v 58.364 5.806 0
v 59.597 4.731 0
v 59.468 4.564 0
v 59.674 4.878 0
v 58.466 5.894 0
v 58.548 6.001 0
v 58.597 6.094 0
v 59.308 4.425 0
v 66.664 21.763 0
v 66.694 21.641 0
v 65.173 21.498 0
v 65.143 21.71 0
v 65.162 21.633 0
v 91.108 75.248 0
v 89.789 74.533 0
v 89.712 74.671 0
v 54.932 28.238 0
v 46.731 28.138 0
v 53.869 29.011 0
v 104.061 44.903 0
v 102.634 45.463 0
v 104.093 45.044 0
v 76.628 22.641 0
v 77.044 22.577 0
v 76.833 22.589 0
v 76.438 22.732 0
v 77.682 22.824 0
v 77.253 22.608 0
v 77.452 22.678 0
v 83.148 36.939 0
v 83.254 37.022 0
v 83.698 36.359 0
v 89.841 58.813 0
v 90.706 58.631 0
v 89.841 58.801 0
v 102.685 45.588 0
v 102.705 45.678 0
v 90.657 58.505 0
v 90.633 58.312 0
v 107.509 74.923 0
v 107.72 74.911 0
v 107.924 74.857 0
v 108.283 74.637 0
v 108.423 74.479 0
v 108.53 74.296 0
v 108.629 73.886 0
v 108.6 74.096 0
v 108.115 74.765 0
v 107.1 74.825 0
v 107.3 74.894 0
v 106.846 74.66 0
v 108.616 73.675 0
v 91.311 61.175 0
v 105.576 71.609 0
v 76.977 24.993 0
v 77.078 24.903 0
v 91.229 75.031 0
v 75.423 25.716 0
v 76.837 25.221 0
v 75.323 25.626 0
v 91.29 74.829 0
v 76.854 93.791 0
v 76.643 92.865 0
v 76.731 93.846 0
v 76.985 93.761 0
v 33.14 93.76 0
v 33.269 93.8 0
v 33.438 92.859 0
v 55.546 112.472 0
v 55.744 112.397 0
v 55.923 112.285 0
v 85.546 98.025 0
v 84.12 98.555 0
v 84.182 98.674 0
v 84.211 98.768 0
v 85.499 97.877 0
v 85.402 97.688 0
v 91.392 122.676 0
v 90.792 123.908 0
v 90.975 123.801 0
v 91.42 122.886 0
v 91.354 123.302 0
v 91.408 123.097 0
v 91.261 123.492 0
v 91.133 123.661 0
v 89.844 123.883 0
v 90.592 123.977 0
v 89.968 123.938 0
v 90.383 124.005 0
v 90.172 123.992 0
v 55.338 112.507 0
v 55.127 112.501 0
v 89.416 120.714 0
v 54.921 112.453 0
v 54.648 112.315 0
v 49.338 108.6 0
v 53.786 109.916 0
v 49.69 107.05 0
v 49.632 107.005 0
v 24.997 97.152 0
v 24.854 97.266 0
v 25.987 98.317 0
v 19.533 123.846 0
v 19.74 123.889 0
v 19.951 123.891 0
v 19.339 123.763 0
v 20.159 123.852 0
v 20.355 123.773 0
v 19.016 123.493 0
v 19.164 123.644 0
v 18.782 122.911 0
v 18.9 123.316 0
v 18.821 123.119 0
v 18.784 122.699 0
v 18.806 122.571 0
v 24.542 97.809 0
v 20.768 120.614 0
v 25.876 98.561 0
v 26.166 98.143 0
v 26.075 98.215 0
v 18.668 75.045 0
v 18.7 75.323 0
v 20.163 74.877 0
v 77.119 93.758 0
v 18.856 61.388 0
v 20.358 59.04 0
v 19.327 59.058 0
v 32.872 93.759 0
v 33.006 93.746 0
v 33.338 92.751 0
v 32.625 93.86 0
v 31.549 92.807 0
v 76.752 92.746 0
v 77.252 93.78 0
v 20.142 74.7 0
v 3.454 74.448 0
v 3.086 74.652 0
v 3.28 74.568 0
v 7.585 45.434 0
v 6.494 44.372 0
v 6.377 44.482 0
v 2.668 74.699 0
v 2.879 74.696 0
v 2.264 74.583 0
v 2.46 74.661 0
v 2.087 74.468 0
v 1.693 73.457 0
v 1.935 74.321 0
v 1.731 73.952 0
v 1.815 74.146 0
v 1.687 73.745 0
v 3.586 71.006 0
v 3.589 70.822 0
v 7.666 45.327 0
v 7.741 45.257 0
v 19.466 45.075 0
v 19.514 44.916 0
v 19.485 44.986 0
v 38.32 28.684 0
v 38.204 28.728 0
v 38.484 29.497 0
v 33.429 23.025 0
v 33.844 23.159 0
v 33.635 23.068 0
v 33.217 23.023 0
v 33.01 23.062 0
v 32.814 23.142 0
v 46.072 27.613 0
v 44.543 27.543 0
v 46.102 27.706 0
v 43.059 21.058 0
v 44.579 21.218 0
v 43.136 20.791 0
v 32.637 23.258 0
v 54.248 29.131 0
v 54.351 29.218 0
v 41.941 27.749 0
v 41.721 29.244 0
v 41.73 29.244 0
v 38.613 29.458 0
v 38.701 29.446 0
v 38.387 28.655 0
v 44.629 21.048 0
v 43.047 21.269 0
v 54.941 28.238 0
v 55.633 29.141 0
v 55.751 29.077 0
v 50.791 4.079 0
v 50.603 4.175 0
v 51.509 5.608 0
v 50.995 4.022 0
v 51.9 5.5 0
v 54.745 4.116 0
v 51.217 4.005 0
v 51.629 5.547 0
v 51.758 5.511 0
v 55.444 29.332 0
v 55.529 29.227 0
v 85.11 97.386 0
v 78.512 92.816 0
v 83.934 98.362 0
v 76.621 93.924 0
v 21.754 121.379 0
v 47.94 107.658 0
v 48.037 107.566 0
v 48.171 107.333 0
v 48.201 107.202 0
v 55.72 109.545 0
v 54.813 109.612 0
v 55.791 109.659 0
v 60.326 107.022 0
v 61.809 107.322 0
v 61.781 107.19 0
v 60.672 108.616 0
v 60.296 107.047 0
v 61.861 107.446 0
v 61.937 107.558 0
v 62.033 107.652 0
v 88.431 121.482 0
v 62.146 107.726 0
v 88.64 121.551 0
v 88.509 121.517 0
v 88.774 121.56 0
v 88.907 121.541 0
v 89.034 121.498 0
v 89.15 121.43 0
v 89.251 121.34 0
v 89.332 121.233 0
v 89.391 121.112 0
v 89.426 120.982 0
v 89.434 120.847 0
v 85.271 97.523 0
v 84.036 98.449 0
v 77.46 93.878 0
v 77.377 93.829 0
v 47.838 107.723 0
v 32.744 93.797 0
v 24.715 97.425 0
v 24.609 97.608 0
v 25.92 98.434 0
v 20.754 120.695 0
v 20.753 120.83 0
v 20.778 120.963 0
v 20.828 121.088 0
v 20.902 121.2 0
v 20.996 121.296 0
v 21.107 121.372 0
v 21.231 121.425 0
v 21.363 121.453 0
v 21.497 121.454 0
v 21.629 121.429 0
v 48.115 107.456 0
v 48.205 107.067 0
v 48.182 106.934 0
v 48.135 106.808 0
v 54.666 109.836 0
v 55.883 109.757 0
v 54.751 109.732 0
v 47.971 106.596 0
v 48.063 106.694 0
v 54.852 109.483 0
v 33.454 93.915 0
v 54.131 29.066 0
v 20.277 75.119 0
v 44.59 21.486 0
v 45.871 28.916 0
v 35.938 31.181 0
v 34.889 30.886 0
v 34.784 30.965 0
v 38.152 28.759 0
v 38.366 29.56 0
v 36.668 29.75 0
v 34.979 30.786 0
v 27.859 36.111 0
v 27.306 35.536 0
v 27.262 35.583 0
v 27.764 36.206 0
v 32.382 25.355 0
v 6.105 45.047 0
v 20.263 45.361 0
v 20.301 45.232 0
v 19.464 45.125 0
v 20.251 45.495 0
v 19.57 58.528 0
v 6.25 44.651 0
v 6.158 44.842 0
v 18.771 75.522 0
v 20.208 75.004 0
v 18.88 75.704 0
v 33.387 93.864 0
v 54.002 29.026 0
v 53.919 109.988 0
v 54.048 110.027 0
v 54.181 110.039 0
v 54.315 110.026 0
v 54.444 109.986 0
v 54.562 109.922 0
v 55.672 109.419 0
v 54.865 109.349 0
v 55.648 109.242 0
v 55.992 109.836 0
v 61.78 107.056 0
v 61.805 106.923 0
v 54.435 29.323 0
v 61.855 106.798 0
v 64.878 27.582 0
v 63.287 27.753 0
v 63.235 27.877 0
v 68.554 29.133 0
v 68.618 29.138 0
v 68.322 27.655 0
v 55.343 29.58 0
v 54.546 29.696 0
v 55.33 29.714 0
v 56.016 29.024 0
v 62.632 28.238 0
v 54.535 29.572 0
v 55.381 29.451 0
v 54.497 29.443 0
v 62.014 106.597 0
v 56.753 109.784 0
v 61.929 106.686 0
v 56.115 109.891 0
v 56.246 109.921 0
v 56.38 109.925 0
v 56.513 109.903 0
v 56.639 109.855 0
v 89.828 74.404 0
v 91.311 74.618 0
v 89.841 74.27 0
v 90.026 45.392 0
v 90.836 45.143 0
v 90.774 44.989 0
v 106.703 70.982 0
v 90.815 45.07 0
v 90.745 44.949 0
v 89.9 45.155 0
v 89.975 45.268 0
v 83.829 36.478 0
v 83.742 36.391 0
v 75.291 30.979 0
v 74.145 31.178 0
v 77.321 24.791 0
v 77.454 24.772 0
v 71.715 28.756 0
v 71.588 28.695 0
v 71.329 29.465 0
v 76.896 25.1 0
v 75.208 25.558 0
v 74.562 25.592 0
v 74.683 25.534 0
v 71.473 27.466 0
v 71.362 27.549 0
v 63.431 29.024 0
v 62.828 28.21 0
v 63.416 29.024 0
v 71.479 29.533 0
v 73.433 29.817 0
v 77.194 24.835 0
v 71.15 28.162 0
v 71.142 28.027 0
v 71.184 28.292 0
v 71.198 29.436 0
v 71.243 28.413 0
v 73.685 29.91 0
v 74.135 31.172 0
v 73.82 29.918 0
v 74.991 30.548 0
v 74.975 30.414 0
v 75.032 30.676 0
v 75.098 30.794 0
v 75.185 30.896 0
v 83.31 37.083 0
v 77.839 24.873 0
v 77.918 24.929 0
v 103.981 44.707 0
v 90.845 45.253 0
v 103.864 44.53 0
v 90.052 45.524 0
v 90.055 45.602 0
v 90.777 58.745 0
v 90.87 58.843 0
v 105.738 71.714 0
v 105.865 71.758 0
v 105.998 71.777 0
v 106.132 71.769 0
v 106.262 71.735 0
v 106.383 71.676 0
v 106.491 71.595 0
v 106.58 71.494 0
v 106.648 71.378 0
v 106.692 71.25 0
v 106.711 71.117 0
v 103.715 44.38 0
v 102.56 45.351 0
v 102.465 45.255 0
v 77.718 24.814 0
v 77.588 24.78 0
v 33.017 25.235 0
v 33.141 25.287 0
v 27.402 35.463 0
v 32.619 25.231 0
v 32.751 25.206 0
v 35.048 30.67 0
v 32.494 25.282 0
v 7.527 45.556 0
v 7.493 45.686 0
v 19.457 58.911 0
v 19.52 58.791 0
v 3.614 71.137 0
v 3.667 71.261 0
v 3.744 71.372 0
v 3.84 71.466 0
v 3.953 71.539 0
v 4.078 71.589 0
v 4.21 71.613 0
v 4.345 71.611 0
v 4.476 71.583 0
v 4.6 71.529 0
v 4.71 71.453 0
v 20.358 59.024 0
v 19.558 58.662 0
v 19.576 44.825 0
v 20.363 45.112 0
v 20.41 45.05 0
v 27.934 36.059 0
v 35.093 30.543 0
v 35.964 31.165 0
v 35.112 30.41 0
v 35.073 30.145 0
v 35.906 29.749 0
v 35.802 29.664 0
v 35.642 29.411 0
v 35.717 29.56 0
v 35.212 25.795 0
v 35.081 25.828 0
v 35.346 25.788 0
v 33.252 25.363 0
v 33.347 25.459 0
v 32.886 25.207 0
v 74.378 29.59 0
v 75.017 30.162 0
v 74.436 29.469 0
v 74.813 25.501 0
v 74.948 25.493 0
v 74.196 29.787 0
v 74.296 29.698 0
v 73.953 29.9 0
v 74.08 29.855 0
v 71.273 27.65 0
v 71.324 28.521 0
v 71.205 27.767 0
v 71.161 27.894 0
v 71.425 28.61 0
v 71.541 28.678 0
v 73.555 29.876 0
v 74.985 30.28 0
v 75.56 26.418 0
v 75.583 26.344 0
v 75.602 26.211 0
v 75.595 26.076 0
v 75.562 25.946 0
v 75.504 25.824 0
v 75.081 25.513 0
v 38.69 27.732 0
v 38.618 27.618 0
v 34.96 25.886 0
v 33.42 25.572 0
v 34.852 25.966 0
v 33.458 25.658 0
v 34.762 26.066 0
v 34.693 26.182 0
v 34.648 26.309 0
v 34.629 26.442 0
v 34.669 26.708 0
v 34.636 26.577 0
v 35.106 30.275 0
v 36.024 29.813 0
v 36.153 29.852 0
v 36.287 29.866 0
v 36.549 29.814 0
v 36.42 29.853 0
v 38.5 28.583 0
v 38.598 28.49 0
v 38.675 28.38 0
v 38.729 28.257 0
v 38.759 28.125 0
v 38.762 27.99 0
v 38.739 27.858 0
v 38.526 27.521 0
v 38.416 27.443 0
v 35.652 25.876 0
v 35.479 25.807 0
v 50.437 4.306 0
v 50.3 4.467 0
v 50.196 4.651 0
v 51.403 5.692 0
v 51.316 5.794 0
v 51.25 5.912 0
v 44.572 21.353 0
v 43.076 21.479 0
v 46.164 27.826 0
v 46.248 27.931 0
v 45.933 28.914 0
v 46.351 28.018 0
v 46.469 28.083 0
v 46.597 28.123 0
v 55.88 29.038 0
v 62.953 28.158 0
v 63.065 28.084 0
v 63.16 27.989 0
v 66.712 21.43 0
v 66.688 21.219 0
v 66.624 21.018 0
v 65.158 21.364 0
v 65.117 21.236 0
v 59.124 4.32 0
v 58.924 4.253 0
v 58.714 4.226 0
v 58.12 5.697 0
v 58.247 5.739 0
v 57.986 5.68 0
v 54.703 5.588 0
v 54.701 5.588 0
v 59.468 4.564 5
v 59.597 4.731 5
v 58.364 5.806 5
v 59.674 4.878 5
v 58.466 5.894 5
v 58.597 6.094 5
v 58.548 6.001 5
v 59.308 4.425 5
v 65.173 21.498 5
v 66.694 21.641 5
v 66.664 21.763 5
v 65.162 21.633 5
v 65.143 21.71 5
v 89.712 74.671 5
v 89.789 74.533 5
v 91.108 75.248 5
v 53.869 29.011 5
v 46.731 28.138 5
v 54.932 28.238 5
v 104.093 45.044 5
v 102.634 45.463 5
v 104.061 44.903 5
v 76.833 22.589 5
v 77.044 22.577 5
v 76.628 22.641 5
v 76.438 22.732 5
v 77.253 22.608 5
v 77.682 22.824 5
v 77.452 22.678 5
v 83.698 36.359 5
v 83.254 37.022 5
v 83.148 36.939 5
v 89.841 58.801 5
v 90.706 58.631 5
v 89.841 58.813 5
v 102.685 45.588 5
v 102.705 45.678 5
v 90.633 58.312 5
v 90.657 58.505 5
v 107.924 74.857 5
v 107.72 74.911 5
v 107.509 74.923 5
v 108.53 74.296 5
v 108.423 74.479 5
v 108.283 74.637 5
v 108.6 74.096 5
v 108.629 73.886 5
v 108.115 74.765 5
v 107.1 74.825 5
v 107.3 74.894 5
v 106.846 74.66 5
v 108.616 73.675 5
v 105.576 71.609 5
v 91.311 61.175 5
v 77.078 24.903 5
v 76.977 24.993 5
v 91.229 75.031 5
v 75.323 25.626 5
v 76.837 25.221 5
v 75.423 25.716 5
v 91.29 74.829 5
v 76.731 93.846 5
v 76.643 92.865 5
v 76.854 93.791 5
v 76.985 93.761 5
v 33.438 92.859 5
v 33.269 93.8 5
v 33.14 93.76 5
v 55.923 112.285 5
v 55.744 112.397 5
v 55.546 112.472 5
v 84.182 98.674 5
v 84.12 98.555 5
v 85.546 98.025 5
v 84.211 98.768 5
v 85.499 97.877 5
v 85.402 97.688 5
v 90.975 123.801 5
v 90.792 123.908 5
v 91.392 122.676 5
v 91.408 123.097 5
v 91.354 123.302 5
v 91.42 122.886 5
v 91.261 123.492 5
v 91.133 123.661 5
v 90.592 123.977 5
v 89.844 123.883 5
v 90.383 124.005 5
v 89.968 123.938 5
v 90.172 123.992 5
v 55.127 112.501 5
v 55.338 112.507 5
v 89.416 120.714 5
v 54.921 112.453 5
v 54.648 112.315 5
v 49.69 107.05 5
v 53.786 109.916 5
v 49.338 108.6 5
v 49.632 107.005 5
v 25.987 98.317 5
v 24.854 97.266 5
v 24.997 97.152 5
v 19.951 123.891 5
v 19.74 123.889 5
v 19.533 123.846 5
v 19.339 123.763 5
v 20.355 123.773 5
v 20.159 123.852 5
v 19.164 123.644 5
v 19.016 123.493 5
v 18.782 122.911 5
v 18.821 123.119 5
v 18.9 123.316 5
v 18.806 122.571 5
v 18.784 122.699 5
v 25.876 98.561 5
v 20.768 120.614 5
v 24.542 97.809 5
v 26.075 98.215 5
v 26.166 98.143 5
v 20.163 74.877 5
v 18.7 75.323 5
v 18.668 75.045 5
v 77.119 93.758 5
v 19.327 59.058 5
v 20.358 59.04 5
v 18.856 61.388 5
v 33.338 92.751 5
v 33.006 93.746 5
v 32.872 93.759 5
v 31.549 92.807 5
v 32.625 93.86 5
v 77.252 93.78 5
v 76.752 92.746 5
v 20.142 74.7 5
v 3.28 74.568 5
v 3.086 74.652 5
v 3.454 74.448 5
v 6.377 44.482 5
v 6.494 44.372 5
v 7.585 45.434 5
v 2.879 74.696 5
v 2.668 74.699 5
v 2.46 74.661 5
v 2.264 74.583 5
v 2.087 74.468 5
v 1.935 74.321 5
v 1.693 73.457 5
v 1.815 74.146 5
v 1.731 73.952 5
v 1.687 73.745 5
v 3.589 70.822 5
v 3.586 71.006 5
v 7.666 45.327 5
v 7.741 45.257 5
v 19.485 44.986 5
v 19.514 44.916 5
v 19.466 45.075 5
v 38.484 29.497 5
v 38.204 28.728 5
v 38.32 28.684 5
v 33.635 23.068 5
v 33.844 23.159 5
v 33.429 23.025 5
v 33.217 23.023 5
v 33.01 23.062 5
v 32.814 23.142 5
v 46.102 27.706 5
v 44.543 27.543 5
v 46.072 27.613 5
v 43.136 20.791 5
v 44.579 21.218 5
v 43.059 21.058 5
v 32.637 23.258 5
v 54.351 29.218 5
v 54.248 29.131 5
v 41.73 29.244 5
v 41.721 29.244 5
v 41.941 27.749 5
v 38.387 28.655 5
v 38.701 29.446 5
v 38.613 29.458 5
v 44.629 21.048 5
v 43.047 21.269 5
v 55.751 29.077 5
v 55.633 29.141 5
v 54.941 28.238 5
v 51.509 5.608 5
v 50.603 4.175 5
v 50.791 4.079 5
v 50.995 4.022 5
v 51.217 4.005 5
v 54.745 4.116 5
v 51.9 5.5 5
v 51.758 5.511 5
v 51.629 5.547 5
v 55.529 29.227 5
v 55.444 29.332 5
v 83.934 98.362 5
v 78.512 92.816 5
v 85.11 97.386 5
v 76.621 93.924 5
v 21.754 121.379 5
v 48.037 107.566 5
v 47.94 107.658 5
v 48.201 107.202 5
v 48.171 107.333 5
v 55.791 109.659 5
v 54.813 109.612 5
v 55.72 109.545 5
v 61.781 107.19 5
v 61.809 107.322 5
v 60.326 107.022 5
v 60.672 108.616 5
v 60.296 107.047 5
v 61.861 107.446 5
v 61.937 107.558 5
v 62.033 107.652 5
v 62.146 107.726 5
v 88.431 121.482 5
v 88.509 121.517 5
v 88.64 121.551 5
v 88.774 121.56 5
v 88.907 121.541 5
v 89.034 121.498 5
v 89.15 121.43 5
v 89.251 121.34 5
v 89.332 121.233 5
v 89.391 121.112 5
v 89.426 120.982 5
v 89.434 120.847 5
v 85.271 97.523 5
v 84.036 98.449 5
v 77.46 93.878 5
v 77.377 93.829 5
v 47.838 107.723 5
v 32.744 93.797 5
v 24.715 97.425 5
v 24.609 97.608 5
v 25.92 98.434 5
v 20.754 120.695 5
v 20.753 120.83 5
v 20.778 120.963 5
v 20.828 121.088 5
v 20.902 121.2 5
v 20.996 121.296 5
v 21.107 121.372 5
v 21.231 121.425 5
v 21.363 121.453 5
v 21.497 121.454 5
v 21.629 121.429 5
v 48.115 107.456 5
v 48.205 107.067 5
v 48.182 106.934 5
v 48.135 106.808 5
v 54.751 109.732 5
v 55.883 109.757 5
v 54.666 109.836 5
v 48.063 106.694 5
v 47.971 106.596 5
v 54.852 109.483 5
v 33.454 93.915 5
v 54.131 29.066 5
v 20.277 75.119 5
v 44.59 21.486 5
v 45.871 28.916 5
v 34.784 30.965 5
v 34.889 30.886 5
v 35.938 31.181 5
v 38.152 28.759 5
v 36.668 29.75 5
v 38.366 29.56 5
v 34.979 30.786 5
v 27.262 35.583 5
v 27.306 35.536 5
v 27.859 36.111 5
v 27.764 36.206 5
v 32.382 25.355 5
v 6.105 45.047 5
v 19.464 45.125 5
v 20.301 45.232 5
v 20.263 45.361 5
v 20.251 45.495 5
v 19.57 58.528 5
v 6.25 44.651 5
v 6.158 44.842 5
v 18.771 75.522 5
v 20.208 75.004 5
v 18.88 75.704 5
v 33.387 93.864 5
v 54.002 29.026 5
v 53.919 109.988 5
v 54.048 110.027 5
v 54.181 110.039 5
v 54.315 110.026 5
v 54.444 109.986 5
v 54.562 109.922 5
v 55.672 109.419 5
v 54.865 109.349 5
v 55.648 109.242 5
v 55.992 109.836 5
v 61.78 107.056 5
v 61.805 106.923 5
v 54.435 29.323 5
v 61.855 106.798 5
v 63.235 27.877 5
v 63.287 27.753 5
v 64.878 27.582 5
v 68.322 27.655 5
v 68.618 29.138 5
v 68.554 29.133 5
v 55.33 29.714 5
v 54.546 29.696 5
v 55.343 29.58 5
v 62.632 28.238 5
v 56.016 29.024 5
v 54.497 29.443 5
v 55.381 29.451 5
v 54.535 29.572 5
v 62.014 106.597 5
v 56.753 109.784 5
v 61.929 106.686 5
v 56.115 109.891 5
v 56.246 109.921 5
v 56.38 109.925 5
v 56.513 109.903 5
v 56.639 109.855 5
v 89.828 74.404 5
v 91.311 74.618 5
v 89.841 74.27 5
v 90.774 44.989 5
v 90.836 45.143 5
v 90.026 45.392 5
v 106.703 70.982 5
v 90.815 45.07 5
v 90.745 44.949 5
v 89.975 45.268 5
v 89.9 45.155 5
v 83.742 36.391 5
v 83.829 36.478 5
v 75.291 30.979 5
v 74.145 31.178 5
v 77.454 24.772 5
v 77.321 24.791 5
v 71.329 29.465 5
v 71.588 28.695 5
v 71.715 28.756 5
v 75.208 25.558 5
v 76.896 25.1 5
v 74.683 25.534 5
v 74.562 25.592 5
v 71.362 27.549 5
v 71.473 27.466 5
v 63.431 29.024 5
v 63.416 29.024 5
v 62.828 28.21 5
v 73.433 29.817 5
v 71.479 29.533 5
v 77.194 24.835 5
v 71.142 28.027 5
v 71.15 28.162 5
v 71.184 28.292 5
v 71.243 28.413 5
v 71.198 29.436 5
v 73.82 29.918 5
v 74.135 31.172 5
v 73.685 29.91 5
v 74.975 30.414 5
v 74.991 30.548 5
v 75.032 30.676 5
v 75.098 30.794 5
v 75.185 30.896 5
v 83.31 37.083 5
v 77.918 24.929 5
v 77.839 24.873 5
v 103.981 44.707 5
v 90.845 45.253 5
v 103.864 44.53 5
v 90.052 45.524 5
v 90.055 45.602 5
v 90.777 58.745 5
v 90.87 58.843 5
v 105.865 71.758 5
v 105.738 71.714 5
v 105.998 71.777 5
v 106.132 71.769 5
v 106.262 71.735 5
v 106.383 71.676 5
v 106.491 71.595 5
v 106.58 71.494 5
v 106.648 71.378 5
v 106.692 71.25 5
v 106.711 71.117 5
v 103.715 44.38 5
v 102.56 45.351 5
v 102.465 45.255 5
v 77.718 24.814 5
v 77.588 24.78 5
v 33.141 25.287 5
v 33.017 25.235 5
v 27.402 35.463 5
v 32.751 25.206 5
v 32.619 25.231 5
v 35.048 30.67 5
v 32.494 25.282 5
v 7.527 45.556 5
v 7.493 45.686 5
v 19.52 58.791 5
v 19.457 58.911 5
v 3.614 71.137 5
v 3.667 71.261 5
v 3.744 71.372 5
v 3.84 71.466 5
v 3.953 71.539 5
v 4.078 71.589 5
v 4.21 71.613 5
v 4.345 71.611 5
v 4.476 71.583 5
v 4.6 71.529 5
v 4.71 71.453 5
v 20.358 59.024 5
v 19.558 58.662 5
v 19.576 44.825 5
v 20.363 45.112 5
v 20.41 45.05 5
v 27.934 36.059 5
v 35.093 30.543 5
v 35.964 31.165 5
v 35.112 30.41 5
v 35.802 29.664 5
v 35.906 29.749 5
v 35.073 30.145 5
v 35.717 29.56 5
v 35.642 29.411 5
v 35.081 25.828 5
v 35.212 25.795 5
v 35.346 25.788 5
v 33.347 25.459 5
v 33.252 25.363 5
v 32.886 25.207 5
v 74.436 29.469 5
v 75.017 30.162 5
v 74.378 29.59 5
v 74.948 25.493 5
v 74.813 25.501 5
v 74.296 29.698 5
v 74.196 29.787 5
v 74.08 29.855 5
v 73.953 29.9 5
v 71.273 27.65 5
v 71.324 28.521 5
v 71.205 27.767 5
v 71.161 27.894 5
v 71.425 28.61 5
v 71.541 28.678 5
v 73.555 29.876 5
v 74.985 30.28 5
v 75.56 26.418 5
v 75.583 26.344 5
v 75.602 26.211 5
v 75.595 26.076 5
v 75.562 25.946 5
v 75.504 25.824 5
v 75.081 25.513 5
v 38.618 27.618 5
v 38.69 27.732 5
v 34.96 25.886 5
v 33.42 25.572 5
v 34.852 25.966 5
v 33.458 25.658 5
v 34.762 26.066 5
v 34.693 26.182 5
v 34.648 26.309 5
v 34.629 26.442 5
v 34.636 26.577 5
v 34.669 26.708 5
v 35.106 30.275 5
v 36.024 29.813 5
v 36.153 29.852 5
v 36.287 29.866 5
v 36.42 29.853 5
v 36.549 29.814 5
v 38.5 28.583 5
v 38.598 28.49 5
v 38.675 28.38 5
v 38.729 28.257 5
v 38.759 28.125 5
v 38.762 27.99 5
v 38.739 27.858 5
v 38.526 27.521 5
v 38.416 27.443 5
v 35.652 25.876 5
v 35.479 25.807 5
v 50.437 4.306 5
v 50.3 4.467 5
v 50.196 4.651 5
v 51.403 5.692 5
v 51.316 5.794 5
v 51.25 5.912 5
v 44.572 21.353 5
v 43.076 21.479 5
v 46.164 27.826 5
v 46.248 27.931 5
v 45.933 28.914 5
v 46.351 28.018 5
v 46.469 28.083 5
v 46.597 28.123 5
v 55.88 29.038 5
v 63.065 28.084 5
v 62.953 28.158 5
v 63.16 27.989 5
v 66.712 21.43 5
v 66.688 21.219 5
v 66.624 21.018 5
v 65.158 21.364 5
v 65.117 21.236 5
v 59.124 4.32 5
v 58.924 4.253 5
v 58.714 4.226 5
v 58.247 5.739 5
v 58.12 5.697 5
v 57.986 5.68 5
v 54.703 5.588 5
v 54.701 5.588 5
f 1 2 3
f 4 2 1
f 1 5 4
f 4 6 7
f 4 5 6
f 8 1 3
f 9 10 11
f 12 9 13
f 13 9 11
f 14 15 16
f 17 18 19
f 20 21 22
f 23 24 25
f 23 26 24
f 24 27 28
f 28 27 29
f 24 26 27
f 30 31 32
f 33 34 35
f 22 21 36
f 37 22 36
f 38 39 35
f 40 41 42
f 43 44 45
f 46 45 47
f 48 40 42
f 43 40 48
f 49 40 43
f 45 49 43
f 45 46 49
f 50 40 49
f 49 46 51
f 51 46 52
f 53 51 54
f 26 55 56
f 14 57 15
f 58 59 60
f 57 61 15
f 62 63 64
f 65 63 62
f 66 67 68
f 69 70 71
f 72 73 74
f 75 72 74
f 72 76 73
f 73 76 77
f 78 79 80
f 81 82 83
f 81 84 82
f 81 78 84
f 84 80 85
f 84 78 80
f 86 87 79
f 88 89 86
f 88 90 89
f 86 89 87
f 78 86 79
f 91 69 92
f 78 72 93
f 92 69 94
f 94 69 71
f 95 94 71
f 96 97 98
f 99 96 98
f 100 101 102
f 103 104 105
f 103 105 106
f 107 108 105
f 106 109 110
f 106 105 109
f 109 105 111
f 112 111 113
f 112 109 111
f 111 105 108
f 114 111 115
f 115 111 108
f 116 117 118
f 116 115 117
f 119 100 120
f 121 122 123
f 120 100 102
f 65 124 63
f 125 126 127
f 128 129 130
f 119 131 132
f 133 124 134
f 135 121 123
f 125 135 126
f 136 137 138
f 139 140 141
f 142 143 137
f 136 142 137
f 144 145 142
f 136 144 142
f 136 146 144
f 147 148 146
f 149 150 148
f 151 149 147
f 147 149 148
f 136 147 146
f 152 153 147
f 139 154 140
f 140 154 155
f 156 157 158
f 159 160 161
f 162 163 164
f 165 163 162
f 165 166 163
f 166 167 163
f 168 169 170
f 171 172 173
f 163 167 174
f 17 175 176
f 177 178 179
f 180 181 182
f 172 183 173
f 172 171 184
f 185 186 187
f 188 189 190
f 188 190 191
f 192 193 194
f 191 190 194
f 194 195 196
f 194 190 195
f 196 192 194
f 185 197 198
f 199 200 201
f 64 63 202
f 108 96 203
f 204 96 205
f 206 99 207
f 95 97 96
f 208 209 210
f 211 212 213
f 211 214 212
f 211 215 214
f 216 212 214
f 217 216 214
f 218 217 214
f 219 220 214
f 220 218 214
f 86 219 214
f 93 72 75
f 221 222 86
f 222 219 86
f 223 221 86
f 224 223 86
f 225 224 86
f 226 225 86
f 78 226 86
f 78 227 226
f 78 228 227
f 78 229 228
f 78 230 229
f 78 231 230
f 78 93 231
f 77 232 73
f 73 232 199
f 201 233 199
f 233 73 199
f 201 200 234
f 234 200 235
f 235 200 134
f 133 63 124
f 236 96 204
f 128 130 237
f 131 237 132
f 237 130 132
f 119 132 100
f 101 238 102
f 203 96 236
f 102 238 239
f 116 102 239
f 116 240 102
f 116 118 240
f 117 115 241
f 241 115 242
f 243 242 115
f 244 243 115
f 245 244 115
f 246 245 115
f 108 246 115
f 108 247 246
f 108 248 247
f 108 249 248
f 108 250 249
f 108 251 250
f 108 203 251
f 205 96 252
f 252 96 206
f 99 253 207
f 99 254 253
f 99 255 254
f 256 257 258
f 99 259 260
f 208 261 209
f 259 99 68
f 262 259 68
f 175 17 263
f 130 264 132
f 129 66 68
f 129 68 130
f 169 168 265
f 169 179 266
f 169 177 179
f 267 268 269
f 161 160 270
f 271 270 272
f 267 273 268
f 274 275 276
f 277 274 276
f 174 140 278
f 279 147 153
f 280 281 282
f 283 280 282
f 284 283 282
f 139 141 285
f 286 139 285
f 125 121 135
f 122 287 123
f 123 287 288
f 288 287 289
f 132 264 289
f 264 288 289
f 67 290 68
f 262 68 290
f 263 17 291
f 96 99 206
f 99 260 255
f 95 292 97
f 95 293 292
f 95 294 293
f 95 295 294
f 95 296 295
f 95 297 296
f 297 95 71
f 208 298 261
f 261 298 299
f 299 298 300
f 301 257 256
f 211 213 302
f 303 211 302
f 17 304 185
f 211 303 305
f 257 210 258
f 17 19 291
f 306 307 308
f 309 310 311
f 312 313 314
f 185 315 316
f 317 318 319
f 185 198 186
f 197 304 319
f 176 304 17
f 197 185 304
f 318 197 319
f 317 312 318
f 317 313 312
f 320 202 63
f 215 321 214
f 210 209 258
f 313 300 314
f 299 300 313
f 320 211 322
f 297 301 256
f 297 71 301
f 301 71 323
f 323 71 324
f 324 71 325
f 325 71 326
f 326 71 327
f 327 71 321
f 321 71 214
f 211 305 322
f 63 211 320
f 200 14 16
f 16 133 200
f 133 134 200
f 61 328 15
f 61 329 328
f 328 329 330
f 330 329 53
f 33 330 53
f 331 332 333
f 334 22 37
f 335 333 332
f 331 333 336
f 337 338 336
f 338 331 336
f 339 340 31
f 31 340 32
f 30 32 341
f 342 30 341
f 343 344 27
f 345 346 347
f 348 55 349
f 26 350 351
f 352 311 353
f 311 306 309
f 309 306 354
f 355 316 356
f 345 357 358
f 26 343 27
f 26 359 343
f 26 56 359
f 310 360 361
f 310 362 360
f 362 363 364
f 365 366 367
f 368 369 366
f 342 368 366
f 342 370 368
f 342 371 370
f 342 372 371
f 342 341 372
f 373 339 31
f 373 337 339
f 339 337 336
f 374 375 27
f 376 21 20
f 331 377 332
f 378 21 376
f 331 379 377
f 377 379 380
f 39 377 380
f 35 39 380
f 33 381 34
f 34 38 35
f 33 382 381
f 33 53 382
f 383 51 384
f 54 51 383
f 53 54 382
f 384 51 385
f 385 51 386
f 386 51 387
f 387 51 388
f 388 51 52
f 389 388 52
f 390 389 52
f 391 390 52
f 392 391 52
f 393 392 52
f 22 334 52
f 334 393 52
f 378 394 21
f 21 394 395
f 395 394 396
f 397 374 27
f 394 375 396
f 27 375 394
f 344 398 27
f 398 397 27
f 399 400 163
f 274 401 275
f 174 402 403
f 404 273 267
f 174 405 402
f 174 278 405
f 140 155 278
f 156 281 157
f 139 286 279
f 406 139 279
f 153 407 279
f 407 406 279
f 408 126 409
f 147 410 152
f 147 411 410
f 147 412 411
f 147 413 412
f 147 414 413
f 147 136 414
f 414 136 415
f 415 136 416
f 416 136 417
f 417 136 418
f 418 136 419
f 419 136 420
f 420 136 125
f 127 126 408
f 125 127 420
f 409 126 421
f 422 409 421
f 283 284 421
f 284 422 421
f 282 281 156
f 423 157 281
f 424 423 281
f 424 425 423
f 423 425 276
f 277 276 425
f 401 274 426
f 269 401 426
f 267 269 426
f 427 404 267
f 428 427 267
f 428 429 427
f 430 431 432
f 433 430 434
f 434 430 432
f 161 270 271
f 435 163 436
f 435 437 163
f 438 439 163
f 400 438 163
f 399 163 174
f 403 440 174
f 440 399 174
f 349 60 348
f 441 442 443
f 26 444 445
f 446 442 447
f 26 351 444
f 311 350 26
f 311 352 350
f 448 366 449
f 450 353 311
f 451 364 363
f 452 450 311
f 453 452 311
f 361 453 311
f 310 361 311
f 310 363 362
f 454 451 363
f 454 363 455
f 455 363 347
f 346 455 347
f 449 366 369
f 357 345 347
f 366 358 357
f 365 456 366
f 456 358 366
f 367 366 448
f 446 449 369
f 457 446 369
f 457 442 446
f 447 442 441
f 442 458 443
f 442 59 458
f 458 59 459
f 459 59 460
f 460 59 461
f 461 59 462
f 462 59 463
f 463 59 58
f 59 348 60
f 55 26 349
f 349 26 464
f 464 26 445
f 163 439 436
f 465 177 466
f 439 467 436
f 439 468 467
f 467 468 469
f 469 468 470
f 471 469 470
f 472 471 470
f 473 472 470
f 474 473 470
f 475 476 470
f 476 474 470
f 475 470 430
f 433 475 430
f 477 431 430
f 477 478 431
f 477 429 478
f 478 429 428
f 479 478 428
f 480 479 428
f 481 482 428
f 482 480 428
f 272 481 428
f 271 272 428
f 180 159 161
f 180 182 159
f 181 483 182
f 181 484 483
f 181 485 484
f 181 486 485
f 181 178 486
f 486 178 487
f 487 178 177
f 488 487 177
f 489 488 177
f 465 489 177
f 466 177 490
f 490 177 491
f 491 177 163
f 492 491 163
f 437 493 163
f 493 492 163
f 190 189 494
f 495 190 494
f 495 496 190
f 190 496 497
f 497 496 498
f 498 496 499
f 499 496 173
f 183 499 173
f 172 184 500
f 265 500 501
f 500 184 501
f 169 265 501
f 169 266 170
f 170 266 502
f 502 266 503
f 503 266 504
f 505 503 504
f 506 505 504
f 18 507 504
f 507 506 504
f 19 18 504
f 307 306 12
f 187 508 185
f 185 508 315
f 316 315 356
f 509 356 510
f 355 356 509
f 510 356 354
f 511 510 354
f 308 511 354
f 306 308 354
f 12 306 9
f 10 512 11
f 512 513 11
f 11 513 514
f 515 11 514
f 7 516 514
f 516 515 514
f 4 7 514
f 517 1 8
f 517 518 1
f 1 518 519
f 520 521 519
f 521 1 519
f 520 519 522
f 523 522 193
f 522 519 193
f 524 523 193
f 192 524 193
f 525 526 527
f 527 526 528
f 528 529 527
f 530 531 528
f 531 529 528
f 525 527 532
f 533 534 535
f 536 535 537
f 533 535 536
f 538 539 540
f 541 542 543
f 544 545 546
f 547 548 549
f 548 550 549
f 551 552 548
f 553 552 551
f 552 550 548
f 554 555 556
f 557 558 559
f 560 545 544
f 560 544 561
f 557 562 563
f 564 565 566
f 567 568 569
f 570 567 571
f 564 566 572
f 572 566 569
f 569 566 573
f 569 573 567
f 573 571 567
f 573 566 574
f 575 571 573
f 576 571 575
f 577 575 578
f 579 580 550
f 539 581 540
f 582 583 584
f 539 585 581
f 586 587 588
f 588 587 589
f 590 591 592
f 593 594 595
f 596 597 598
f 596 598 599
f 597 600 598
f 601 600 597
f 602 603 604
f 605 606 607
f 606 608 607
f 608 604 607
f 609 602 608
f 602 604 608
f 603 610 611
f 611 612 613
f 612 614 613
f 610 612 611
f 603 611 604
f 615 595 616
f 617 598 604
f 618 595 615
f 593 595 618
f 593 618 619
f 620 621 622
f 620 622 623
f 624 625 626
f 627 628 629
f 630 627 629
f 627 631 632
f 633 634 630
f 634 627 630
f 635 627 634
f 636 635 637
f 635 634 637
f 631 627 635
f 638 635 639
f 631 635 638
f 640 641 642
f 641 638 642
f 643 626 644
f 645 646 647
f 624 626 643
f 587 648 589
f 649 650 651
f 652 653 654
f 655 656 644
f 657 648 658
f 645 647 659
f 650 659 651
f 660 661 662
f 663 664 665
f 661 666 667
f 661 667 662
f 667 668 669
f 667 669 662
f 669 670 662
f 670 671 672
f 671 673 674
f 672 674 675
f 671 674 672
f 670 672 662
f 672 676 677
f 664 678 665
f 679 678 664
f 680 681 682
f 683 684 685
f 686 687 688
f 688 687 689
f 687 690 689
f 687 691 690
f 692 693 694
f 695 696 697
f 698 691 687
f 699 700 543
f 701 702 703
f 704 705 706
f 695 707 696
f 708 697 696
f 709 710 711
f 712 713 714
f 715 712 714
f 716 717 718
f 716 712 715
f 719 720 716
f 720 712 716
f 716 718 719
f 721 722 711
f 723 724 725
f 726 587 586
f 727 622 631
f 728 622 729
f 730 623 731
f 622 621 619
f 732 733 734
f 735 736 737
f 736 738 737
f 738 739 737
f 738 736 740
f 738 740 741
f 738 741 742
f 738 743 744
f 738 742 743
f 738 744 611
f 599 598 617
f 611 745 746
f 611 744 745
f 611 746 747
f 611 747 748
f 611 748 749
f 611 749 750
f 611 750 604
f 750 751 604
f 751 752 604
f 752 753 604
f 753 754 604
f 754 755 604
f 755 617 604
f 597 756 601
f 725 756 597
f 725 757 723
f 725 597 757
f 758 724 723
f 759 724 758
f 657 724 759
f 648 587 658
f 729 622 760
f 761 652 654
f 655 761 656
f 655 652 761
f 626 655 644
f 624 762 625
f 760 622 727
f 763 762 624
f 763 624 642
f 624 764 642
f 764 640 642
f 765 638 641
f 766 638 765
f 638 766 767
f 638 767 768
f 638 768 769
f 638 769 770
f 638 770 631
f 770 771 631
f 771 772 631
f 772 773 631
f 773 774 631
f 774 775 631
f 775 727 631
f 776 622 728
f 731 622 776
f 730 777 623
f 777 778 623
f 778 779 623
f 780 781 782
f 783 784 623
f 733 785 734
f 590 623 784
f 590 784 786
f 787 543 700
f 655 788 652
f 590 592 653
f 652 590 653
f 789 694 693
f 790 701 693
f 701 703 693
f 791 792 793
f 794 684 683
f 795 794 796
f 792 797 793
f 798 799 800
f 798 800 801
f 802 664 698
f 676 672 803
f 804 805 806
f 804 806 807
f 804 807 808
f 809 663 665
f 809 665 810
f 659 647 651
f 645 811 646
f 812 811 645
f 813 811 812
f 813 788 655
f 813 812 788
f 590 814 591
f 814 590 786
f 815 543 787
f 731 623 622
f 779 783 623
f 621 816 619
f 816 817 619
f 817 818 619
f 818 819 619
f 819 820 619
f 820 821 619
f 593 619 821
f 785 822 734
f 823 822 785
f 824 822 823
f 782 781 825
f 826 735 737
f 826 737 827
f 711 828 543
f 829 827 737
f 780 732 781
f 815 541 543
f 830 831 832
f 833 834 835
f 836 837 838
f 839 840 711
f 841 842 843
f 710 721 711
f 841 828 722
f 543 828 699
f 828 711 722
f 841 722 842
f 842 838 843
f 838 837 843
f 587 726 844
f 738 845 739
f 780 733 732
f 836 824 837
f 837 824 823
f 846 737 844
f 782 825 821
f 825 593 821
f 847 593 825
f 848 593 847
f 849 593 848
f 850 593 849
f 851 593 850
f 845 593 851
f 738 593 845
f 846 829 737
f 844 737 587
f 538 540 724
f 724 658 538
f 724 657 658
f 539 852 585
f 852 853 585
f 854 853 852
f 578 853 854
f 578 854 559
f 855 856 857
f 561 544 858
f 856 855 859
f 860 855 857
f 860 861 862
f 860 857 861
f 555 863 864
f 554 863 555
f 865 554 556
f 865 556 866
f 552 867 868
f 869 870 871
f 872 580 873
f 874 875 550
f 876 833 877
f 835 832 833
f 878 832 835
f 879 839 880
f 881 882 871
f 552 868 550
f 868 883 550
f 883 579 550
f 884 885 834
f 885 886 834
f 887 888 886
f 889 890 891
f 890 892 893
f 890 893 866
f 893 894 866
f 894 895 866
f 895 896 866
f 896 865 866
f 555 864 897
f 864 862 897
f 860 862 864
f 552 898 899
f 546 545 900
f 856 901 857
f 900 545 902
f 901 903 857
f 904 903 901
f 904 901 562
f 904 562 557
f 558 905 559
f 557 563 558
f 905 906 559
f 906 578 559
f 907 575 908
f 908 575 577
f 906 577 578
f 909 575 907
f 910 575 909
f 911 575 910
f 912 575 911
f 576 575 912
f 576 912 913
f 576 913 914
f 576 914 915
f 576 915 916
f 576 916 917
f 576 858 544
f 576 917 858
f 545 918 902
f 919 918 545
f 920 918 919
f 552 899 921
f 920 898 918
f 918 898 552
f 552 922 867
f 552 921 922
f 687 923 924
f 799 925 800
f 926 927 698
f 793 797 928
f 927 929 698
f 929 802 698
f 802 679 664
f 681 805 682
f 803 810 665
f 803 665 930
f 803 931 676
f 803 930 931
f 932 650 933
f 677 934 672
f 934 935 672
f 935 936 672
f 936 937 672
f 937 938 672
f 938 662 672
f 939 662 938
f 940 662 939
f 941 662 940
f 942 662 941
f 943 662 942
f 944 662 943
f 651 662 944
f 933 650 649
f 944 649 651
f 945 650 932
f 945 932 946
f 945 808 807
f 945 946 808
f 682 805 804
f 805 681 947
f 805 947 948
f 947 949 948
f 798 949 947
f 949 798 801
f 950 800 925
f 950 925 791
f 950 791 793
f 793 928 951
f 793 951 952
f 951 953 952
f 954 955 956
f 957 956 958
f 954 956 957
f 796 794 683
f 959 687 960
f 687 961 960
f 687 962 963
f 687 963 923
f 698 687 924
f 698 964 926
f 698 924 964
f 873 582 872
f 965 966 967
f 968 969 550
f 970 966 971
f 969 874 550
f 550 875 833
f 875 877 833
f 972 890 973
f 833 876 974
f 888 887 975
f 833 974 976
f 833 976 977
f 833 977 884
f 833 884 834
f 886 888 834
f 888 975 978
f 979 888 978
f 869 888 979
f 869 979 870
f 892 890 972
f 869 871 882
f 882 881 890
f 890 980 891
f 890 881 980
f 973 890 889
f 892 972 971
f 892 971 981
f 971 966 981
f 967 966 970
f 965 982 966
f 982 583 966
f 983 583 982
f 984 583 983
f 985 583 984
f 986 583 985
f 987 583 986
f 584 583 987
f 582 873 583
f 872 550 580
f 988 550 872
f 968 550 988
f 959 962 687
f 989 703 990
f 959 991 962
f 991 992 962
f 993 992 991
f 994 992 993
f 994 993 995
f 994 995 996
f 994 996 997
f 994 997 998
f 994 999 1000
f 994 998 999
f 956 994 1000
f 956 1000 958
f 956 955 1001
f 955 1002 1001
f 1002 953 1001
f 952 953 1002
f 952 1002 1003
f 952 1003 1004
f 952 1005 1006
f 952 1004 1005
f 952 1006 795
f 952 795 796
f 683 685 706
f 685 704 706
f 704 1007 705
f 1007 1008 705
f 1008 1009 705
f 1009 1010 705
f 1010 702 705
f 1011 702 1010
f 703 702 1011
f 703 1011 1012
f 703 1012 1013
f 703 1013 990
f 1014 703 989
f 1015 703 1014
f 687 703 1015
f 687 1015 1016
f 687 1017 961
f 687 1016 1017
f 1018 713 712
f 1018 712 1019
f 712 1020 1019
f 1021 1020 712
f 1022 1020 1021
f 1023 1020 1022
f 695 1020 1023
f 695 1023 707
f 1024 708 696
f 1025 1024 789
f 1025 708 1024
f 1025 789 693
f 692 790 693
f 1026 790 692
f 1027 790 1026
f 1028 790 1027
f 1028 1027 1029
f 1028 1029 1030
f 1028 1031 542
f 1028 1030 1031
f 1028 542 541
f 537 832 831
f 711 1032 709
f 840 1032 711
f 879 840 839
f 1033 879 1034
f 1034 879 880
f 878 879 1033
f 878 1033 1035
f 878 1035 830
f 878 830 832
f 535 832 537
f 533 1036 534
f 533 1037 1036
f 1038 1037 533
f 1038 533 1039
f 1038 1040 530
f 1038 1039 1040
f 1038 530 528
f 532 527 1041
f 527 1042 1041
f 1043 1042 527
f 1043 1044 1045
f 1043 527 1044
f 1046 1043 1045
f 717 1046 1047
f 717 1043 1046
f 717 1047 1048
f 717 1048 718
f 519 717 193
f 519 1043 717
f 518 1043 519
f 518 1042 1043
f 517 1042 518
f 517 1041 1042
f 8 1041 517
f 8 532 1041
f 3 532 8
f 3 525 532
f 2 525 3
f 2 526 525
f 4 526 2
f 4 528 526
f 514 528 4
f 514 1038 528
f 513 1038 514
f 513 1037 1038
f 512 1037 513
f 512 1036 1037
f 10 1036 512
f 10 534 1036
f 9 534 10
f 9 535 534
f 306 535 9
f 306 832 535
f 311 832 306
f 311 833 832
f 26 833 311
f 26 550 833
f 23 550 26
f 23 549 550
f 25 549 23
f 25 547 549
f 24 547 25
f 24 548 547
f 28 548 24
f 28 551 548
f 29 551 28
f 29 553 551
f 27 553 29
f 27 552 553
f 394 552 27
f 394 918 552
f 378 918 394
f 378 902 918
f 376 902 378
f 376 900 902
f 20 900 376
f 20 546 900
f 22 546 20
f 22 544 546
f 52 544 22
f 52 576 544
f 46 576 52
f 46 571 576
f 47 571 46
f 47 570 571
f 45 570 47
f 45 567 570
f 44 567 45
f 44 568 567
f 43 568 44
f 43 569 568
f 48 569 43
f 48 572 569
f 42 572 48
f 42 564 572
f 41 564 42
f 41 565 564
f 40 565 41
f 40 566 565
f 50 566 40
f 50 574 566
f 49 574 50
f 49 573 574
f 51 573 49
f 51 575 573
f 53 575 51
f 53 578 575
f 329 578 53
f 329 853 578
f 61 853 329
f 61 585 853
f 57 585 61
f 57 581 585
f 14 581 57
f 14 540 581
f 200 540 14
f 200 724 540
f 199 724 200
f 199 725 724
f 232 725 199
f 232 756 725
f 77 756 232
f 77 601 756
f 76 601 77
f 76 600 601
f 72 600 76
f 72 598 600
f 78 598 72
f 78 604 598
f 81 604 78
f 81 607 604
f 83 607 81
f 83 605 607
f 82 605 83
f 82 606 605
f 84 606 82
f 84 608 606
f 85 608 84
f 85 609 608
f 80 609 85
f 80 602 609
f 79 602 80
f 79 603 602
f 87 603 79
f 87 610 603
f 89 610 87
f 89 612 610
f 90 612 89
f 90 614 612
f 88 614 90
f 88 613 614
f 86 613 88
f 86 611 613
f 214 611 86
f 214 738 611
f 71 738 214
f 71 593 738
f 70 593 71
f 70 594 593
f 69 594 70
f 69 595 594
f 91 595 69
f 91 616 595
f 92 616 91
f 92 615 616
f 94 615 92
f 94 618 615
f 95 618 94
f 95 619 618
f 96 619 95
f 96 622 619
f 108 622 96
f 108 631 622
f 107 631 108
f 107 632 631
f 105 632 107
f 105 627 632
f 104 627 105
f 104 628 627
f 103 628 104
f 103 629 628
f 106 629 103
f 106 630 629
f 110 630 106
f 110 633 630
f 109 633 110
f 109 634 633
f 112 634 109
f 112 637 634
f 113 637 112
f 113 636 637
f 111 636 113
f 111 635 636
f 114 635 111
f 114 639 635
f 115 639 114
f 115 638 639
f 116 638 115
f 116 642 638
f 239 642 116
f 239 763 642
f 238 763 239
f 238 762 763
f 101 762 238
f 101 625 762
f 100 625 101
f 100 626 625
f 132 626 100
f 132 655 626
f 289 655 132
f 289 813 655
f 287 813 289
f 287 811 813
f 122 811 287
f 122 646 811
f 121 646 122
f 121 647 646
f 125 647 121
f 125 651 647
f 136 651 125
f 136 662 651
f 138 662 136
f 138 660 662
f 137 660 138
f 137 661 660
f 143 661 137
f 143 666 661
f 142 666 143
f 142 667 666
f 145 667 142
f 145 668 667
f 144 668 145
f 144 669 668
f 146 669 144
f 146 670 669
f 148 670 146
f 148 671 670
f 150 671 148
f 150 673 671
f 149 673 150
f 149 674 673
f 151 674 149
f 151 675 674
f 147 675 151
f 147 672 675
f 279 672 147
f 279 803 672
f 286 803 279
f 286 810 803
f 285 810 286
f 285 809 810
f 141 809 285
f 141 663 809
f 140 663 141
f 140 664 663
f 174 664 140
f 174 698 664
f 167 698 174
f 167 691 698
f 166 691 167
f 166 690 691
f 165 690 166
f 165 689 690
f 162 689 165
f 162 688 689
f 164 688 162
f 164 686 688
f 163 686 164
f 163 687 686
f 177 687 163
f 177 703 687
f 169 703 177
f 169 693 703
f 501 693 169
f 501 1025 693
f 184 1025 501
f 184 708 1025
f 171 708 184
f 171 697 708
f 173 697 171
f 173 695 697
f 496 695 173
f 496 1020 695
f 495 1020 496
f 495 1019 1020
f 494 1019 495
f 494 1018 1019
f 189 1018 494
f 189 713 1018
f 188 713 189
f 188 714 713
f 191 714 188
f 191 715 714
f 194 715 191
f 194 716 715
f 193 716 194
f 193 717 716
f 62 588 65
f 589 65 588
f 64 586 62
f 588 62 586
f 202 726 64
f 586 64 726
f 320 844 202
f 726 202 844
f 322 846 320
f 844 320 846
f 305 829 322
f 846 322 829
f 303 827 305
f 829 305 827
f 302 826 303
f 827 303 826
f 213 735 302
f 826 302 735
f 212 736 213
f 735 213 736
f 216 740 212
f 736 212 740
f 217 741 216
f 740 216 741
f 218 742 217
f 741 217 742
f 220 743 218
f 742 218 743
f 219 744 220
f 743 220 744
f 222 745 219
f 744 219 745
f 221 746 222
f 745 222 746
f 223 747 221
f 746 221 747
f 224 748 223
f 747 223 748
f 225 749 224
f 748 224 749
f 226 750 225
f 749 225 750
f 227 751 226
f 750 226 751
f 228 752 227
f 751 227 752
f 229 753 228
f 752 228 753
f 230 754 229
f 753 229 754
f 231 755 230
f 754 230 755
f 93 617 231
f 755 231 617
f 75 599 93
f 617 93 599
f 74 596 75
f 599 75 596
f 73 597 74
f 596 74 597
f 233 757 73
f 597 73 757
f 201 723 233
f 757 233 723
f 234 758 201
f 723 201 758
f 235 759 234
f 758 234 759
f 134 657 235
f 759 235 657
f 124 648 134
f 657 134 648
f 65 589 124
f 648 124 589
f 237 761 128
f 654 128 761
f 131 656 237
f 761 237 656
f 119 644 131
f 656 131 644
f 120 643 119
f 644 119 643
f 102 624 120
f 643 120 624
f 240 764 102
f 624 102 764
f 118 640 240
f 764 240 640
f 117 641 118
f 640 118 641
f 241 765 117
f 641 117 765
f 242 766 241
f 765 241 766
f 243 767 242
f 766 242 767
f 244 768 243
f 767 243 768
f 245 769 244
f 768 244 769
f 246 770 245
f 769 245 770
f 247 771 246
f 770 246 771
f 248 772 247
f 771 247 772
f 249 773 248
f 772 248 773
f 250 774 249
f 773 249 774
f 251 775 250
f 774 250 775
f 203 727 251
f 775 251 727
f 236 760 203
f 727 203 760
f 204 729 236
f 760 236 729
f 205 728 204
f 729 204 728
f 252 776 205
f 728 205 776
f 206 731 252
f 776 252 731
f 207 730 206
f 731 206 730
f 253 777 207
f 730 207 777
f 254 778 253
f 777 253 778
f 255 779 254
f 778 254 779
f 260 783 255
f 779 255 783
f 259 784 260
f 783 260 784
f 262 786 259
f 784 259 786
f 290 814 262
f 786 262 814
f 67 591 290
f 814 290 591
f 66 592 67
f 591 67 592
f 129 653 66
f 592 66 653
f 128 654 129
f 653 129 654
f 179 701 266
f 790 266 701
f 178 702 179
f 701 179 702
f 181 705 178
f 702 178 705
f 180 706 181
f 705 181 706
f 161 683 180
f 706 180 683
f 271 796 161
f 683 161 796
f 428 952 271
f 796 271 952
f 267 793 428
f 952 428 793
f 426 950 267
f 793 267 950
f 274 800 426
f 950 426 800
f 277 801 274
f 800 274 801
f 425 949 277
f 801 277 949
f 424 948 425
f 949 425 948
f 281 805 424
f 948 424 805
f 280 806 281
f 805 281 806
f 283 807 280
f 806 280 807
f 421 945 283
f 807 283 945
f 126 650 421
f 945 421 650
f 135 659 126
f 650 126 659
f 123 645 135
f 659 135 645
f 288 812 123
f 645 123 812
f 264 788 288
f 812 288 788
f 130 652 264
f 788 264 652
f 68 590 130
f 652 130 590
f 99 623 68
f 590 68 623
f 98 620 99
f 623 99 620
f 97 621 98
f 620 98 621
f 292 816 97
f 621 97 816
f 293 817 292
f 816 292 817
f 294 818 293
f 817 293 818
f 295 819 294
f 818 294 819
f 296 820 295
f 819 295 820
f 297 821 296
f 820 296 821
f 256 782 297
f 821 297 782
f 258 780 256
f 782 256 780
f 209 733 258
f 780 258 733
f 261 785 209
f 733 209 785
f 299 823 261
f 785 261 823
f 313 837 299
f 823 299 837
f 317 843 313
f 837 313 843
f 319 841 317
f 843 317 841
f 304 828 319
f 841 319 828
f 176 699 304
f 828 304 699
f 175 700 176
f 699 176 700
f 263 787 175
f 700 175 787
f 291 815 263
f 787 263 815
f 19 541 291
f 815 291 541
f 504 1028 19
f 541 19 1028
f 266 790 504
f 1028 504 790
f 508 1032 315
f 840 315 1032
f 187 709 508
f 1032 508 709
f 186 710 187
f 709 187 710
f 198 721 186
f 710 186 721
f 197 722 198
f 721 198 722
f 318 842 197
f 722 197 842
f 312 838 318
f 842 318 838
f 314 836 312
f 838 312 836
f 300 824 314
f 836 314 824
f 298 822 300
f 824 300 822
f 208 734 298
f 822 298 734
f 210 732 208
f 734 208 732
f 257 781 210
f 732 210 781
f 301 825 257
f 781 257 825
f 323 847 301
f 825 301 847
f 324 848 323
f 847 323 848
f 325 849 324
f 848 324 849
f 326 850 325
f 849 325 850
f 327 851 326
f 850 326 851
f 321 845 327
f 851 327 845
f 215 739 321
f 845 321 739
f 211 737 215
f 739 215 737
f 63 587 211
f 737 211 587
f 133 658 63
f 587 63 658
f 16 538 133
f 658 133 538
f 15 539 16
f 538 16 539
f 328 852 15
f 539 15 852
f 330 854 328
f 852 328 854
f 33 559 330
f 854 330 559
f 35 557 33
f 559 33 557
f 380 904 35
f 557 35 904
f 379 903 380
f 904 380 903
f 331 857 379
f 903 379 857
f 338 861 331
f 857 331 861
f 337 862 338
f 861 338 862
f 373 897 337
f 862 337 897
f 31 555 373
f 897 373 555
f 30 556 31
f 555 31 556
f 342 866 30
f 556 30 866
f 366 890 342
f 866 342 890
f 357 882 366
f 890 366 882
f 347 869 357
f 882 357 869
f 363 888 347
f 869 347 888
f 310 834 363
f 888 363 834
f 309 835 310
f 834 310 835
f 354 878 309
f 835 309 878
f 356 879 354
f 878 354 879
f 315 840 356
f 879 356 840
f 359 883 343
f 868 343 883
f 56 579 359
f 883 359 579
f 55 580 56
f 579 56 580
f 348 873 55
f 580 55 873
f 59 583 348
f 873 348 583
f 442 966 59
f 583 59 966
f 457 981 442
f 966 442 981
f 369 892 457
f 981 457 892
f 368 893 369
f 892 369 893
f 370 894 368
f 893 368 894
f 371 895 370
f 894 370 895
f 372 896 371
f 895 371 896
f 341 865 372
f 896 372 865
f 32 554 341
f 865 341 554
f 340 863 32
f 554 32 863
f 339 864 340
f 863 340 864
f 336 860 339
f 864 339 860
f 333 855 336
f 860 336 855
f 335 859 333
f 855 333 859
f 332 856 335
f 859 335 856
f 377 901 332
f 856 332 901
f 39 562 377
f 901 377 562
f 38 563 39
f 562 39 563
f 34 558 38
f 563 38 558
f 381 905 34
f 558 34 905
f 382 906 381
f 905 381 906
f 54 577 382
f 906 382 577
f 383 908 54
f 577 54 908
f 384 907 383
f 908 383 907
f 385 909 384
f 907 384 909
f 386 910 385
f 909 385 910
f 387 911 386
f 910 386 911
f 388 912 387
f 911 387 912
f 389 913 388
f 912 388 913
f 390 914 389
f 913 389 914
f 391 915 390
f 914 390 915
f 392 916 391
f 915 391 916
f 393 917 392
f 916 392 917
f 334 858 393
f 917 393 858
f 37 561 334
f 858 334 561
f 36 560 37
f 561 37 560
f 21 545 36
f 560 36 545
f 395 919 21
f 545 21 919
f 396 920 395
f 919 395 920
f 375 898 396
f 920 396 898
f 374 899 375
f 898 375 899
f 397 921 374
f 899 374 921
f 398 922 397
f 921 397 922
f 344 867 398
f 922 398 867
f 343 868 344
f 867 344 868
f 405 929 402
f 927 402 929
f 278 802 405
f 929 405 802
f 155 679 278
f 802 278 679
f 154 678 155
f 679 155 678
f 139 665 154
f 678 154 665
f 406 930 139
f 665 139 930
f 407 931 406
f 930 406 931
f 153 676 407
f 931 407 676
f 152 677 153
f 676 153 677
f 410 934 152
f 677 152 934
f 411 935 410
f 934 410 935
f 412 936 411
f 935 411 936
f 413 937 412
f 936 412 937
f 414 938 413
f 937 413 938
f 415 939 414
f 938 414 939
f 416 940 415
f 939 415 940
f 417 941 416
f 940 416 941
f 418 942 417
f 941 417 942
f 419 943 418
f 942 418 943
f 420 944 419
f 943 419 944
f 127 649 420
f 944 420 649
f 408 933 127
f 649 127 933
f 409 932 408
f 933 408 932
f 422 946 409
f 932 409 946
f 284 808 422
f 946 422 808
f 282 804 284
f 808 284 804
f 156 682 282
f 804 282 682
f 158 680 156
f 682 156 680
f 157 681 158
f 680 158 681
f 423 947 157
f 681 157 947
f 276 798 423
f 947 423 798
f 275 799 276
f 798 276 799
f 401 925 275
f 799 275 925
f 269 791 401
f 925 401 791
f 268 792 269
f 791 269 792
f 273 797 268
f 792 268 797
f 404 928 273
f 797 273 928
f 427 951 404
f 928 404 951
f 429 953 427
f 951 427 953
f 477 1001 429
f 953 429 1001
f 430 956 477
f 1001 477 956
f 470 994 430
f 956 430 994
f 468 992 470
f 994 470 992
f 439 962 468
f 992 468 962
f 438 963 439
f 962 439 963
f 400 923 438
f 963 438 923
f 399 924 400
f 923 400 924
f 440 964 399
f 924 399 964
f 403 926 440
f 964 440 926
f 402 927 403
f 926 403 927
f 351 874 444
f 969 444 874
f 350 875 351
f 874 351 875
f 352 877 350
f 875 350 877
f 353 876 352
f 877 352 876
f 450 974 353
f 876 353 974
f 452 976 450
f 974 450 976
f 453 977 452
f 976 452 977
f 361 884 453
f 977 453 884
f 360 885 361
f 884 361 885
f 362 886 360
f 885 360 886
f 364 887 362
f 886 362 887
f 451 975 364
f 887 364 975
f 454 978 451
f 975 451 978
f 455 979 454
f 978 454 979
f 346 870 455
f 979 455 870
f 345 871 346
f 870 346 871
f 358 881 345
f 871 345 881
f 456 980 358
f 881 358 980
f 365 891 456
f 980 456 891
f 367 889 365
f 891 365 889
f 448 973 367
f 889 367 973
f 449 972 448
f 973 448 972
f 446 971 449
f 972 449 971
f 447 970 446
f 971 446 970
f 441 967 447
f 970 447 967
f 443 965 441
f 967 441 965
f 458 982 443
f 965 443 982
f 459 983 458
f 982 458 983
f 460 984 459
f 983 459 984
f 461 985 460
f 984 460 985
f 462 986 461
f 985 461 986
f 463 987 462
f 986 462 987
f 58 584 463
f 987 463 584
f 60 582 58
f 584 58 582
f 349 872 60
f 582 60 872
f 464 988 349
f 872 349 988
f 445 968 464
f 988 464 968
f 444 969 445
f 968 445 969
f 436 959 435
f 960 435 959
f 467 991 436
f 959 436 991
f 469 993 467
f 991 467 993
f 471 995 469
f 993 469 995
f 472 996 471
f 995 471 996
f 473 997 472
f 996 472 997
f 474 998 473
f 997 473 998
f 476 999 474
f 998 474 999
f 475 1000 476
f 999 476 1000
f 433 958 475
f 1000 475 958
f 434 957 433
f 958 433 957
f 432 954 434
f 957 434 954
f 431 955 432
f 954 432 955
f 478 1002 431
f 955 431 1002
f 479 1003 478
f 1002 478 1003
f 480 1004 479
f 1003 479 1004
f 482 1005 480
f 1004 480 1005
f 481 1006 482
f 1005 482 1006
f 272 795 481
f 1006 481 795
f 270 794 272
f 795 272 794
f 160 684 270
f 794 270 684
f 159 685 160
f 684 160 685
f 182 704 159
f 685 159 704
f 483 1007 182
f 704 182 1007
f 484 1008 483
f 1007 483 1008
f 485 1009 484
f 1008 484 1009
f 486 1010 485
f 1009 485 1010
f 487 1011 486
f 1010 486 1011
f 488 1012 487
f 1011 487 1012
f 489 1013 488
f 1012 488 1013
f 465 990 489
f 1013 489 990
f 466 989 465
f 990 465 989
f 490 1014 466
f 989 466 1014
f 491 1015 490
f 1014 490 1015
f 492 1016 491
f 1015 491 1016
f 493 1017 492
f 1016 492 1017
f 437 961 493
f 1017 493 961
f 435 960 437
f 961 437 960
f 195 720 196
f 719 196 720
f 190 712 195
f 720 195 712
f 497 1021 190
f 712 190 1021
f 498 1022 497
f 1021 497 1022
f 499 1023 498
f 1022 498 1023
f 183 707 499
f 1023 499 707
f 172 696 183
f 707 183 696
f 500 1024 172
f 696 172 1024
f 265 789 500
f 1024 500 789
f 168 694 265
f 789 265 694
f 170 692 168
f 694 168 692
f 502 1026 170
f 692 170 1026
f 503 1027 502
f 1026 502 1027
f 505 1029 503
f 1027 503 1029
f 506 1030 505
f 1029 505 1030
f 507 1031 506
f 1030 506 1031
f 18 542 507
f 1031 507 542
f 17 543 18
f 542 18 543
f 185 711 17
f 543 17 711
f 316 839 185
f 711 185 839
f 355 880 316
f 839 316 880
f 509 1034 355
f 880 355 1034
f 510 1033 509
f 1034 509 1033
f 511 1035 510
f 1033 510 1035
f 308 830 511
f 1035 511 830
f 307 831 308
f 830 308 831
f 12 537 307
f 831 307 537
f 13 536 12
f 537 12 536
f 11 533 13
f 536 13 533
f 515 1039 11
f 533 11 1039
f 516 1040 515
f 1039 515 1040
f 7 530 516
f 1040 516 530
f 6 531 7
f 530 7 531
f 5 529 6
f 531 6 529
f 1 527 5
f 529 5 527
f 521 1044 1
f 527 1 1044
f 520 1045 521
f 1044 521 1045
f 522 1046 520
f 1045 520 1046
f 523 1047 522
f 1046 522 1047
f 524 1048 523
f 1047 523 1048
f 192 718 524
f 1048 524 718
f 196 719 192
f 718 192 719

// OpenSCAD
/*
 * Customizable Origami - Turtle - https://www.thingiverse.com/thing:2722560
 * by Dennis Hofmann - https://www.thingiverse.com/mightynozzle/about
 * created 2017-12-20
 * version v1.0
 *
 * Changelog
 * --------------
 * v1.0:
 *      - final design
 * --------------
 * 
 * This work is licensed under the Creative Commons - Attribution - NonCommercial - ShareAlike license.
 * https://creativecommons.org/licenses/by-nc-sa/3.0/
 */


 // Parameter Section //
//-------------------//

// preview[view:north, tilt:top]

// The maximum size of the longest side. The shorter side will be automatically resized in same ratio.
max_size_in_millimeter = 120; //[20:300]

// The height of the model.
model_height_in_millimeter = 5; //[0.2:0.2:100]

// Thickness of the outer outline.
outline_size_in_millimeter = 1.5; //[0.5:0.1:20]

// Thickness of the inner outline.
inline_size_in_millimeter = 0.8; //[0.5:0.1:20]

// Roundiness of the ends of the inner outlines.
inline_edge_radius_in_millimeter = 0.7; //[0.0:0.1:5]

// Flip model
flip_model = "no"; //[yes,no]

/*[hidden]*/
max_size = max_size_in_millimeter;
model_height = model_height_in_millimeter;
$fn=32;

// Outer Points
A1 = [464, 46];
A2 = [496, 47];
A3 = [532, 48];
A4 = [595, 194];
A5 = [575, 259];
A6 = [622, 260];
A7 = [698, 214];
A8 = [934, 409];
A9 = [975, 668];
A10 = [818, 532];
A11 = [818, 675];
A12 = [698, 842];
A13 = [766, 889];
A14 = [819, 1112];
A15 = [549, 971];
A16 = [501, 1008];
A17 = [448, 971];
A18 = [180, 1111];
A19 = [232, 887];
A20 = [300, 842];
A21 = [179, 679];
A22 = [181, 534];
A23 = [25, 666];
A24 = [65, 409];
A25 = [302, 218];
A26 = [378, 261];
A27 = [416, 258];
A28 = [400, 192];

outline = [A1, A2, A3, A4, A5, A6, A7, A8, A9, A10, A11, A12, A13, A14, A15, A16, A17, A18, A19, A20, A21, A22, A23, A24, A25, A26, A27, A28];

// Inner Points
B1 = [498, 259];
B2 = [648, 263];
B3 = [674, 279];
B4 = [757, 332];
B5 = [820, 409];
B6 = [348, 263];
B7 = [324, 279];
B8 = [250, 324];
B9 = [180, 408];

// Polygons
C1 = [A1, A2, A3, A4, A5, B1, A27, A28];
C2 = [A2, B1, A27, A28, A1];
C3 = [A6, A7, B3, B2];
C4 = [A7, A8, A9, A10, B5, B4, B3];
C5 = [B5, A10, A11, A12, A15, A16, B1, A5, A6, B2, B3, B4];
C6 = [A26, A25, B7, B6];
C7 = [A25, A24, A23, A22, B9, B8, B7];
C8 = [B1, A16, A17, A20, A21, A22, B9, B8, B7, B6, A26, A27];
C9 = [A20, A19, A18, A17];
C10 = [A12, A13, A14, A15];

cut_polygons = [C1, /*C2,*/ C3, C4, C5, C6, C7, C8, C9, C10];

min_x = A23[0];
min_y = A1[1];
max_x = A9[0];
max_y = A14[1];

x_size = max_x - min_x;
y_size = max_y - min_y;

x_factor = max_size / x_size;
y_factor = max_size / y_size;

inline_size = x_size > y_size ? inline_size_in_millimeter / x_factor / 2: inline_size_in_millimeter / y_factor / 2;
inline_edge_radius = x_size > y_size ? inline_edge_radius_in_millimeter / x_factor: inline_edge_radius_in_millimeter / y_factor;
outline_size = x_size > y_size ? outline_size_in_millimeter / x_factor - inline_size: outline_size_in_millimeter / y_factor - inline_size;


 // Program Section //
//-----------------//

if(x_size > y_size) {
    resize(newsize=[max_size, x_factor * y_size, model_height]){
        if(flip_model == "yes") {
            mirror([0,1,0]) {
                rotate([180,180,0]) {    
                    create(outline, cut_polygons);
                }
            }
        } else {
            create(outline, cut_polygons);
        }
    }
} else {
    resize(newsize=[y_factor * x_size, max_size, model_height]){
        if(flip_model == "yes") {
            mirror([0,1,0]) {
                rotate([180,180,0]) {    
                    create(outline, cut_polygons);
                }
            }
        } else {
            create(outline, cut_polygons);
        }
    }
}


 // Module Section //
//----------------//

module create() {
    linear_extrude(height=1) {
        difference() {
            offset(r = -0) {
                offset(r = +outline_size) {
                    polygon(points = outline, convexity = 10);
                }
            }
            
            for(cut_polygon = [0:len(cut_polygons)]) {
                offset(r = +inline_edge_radius) {
                    offset(r = -inline_size - inline_edge_radius) {
                        polygon(points = cut_polygons[cut_polygon], convexity = 10);
                    }
                }
            }
        }
    }
}
